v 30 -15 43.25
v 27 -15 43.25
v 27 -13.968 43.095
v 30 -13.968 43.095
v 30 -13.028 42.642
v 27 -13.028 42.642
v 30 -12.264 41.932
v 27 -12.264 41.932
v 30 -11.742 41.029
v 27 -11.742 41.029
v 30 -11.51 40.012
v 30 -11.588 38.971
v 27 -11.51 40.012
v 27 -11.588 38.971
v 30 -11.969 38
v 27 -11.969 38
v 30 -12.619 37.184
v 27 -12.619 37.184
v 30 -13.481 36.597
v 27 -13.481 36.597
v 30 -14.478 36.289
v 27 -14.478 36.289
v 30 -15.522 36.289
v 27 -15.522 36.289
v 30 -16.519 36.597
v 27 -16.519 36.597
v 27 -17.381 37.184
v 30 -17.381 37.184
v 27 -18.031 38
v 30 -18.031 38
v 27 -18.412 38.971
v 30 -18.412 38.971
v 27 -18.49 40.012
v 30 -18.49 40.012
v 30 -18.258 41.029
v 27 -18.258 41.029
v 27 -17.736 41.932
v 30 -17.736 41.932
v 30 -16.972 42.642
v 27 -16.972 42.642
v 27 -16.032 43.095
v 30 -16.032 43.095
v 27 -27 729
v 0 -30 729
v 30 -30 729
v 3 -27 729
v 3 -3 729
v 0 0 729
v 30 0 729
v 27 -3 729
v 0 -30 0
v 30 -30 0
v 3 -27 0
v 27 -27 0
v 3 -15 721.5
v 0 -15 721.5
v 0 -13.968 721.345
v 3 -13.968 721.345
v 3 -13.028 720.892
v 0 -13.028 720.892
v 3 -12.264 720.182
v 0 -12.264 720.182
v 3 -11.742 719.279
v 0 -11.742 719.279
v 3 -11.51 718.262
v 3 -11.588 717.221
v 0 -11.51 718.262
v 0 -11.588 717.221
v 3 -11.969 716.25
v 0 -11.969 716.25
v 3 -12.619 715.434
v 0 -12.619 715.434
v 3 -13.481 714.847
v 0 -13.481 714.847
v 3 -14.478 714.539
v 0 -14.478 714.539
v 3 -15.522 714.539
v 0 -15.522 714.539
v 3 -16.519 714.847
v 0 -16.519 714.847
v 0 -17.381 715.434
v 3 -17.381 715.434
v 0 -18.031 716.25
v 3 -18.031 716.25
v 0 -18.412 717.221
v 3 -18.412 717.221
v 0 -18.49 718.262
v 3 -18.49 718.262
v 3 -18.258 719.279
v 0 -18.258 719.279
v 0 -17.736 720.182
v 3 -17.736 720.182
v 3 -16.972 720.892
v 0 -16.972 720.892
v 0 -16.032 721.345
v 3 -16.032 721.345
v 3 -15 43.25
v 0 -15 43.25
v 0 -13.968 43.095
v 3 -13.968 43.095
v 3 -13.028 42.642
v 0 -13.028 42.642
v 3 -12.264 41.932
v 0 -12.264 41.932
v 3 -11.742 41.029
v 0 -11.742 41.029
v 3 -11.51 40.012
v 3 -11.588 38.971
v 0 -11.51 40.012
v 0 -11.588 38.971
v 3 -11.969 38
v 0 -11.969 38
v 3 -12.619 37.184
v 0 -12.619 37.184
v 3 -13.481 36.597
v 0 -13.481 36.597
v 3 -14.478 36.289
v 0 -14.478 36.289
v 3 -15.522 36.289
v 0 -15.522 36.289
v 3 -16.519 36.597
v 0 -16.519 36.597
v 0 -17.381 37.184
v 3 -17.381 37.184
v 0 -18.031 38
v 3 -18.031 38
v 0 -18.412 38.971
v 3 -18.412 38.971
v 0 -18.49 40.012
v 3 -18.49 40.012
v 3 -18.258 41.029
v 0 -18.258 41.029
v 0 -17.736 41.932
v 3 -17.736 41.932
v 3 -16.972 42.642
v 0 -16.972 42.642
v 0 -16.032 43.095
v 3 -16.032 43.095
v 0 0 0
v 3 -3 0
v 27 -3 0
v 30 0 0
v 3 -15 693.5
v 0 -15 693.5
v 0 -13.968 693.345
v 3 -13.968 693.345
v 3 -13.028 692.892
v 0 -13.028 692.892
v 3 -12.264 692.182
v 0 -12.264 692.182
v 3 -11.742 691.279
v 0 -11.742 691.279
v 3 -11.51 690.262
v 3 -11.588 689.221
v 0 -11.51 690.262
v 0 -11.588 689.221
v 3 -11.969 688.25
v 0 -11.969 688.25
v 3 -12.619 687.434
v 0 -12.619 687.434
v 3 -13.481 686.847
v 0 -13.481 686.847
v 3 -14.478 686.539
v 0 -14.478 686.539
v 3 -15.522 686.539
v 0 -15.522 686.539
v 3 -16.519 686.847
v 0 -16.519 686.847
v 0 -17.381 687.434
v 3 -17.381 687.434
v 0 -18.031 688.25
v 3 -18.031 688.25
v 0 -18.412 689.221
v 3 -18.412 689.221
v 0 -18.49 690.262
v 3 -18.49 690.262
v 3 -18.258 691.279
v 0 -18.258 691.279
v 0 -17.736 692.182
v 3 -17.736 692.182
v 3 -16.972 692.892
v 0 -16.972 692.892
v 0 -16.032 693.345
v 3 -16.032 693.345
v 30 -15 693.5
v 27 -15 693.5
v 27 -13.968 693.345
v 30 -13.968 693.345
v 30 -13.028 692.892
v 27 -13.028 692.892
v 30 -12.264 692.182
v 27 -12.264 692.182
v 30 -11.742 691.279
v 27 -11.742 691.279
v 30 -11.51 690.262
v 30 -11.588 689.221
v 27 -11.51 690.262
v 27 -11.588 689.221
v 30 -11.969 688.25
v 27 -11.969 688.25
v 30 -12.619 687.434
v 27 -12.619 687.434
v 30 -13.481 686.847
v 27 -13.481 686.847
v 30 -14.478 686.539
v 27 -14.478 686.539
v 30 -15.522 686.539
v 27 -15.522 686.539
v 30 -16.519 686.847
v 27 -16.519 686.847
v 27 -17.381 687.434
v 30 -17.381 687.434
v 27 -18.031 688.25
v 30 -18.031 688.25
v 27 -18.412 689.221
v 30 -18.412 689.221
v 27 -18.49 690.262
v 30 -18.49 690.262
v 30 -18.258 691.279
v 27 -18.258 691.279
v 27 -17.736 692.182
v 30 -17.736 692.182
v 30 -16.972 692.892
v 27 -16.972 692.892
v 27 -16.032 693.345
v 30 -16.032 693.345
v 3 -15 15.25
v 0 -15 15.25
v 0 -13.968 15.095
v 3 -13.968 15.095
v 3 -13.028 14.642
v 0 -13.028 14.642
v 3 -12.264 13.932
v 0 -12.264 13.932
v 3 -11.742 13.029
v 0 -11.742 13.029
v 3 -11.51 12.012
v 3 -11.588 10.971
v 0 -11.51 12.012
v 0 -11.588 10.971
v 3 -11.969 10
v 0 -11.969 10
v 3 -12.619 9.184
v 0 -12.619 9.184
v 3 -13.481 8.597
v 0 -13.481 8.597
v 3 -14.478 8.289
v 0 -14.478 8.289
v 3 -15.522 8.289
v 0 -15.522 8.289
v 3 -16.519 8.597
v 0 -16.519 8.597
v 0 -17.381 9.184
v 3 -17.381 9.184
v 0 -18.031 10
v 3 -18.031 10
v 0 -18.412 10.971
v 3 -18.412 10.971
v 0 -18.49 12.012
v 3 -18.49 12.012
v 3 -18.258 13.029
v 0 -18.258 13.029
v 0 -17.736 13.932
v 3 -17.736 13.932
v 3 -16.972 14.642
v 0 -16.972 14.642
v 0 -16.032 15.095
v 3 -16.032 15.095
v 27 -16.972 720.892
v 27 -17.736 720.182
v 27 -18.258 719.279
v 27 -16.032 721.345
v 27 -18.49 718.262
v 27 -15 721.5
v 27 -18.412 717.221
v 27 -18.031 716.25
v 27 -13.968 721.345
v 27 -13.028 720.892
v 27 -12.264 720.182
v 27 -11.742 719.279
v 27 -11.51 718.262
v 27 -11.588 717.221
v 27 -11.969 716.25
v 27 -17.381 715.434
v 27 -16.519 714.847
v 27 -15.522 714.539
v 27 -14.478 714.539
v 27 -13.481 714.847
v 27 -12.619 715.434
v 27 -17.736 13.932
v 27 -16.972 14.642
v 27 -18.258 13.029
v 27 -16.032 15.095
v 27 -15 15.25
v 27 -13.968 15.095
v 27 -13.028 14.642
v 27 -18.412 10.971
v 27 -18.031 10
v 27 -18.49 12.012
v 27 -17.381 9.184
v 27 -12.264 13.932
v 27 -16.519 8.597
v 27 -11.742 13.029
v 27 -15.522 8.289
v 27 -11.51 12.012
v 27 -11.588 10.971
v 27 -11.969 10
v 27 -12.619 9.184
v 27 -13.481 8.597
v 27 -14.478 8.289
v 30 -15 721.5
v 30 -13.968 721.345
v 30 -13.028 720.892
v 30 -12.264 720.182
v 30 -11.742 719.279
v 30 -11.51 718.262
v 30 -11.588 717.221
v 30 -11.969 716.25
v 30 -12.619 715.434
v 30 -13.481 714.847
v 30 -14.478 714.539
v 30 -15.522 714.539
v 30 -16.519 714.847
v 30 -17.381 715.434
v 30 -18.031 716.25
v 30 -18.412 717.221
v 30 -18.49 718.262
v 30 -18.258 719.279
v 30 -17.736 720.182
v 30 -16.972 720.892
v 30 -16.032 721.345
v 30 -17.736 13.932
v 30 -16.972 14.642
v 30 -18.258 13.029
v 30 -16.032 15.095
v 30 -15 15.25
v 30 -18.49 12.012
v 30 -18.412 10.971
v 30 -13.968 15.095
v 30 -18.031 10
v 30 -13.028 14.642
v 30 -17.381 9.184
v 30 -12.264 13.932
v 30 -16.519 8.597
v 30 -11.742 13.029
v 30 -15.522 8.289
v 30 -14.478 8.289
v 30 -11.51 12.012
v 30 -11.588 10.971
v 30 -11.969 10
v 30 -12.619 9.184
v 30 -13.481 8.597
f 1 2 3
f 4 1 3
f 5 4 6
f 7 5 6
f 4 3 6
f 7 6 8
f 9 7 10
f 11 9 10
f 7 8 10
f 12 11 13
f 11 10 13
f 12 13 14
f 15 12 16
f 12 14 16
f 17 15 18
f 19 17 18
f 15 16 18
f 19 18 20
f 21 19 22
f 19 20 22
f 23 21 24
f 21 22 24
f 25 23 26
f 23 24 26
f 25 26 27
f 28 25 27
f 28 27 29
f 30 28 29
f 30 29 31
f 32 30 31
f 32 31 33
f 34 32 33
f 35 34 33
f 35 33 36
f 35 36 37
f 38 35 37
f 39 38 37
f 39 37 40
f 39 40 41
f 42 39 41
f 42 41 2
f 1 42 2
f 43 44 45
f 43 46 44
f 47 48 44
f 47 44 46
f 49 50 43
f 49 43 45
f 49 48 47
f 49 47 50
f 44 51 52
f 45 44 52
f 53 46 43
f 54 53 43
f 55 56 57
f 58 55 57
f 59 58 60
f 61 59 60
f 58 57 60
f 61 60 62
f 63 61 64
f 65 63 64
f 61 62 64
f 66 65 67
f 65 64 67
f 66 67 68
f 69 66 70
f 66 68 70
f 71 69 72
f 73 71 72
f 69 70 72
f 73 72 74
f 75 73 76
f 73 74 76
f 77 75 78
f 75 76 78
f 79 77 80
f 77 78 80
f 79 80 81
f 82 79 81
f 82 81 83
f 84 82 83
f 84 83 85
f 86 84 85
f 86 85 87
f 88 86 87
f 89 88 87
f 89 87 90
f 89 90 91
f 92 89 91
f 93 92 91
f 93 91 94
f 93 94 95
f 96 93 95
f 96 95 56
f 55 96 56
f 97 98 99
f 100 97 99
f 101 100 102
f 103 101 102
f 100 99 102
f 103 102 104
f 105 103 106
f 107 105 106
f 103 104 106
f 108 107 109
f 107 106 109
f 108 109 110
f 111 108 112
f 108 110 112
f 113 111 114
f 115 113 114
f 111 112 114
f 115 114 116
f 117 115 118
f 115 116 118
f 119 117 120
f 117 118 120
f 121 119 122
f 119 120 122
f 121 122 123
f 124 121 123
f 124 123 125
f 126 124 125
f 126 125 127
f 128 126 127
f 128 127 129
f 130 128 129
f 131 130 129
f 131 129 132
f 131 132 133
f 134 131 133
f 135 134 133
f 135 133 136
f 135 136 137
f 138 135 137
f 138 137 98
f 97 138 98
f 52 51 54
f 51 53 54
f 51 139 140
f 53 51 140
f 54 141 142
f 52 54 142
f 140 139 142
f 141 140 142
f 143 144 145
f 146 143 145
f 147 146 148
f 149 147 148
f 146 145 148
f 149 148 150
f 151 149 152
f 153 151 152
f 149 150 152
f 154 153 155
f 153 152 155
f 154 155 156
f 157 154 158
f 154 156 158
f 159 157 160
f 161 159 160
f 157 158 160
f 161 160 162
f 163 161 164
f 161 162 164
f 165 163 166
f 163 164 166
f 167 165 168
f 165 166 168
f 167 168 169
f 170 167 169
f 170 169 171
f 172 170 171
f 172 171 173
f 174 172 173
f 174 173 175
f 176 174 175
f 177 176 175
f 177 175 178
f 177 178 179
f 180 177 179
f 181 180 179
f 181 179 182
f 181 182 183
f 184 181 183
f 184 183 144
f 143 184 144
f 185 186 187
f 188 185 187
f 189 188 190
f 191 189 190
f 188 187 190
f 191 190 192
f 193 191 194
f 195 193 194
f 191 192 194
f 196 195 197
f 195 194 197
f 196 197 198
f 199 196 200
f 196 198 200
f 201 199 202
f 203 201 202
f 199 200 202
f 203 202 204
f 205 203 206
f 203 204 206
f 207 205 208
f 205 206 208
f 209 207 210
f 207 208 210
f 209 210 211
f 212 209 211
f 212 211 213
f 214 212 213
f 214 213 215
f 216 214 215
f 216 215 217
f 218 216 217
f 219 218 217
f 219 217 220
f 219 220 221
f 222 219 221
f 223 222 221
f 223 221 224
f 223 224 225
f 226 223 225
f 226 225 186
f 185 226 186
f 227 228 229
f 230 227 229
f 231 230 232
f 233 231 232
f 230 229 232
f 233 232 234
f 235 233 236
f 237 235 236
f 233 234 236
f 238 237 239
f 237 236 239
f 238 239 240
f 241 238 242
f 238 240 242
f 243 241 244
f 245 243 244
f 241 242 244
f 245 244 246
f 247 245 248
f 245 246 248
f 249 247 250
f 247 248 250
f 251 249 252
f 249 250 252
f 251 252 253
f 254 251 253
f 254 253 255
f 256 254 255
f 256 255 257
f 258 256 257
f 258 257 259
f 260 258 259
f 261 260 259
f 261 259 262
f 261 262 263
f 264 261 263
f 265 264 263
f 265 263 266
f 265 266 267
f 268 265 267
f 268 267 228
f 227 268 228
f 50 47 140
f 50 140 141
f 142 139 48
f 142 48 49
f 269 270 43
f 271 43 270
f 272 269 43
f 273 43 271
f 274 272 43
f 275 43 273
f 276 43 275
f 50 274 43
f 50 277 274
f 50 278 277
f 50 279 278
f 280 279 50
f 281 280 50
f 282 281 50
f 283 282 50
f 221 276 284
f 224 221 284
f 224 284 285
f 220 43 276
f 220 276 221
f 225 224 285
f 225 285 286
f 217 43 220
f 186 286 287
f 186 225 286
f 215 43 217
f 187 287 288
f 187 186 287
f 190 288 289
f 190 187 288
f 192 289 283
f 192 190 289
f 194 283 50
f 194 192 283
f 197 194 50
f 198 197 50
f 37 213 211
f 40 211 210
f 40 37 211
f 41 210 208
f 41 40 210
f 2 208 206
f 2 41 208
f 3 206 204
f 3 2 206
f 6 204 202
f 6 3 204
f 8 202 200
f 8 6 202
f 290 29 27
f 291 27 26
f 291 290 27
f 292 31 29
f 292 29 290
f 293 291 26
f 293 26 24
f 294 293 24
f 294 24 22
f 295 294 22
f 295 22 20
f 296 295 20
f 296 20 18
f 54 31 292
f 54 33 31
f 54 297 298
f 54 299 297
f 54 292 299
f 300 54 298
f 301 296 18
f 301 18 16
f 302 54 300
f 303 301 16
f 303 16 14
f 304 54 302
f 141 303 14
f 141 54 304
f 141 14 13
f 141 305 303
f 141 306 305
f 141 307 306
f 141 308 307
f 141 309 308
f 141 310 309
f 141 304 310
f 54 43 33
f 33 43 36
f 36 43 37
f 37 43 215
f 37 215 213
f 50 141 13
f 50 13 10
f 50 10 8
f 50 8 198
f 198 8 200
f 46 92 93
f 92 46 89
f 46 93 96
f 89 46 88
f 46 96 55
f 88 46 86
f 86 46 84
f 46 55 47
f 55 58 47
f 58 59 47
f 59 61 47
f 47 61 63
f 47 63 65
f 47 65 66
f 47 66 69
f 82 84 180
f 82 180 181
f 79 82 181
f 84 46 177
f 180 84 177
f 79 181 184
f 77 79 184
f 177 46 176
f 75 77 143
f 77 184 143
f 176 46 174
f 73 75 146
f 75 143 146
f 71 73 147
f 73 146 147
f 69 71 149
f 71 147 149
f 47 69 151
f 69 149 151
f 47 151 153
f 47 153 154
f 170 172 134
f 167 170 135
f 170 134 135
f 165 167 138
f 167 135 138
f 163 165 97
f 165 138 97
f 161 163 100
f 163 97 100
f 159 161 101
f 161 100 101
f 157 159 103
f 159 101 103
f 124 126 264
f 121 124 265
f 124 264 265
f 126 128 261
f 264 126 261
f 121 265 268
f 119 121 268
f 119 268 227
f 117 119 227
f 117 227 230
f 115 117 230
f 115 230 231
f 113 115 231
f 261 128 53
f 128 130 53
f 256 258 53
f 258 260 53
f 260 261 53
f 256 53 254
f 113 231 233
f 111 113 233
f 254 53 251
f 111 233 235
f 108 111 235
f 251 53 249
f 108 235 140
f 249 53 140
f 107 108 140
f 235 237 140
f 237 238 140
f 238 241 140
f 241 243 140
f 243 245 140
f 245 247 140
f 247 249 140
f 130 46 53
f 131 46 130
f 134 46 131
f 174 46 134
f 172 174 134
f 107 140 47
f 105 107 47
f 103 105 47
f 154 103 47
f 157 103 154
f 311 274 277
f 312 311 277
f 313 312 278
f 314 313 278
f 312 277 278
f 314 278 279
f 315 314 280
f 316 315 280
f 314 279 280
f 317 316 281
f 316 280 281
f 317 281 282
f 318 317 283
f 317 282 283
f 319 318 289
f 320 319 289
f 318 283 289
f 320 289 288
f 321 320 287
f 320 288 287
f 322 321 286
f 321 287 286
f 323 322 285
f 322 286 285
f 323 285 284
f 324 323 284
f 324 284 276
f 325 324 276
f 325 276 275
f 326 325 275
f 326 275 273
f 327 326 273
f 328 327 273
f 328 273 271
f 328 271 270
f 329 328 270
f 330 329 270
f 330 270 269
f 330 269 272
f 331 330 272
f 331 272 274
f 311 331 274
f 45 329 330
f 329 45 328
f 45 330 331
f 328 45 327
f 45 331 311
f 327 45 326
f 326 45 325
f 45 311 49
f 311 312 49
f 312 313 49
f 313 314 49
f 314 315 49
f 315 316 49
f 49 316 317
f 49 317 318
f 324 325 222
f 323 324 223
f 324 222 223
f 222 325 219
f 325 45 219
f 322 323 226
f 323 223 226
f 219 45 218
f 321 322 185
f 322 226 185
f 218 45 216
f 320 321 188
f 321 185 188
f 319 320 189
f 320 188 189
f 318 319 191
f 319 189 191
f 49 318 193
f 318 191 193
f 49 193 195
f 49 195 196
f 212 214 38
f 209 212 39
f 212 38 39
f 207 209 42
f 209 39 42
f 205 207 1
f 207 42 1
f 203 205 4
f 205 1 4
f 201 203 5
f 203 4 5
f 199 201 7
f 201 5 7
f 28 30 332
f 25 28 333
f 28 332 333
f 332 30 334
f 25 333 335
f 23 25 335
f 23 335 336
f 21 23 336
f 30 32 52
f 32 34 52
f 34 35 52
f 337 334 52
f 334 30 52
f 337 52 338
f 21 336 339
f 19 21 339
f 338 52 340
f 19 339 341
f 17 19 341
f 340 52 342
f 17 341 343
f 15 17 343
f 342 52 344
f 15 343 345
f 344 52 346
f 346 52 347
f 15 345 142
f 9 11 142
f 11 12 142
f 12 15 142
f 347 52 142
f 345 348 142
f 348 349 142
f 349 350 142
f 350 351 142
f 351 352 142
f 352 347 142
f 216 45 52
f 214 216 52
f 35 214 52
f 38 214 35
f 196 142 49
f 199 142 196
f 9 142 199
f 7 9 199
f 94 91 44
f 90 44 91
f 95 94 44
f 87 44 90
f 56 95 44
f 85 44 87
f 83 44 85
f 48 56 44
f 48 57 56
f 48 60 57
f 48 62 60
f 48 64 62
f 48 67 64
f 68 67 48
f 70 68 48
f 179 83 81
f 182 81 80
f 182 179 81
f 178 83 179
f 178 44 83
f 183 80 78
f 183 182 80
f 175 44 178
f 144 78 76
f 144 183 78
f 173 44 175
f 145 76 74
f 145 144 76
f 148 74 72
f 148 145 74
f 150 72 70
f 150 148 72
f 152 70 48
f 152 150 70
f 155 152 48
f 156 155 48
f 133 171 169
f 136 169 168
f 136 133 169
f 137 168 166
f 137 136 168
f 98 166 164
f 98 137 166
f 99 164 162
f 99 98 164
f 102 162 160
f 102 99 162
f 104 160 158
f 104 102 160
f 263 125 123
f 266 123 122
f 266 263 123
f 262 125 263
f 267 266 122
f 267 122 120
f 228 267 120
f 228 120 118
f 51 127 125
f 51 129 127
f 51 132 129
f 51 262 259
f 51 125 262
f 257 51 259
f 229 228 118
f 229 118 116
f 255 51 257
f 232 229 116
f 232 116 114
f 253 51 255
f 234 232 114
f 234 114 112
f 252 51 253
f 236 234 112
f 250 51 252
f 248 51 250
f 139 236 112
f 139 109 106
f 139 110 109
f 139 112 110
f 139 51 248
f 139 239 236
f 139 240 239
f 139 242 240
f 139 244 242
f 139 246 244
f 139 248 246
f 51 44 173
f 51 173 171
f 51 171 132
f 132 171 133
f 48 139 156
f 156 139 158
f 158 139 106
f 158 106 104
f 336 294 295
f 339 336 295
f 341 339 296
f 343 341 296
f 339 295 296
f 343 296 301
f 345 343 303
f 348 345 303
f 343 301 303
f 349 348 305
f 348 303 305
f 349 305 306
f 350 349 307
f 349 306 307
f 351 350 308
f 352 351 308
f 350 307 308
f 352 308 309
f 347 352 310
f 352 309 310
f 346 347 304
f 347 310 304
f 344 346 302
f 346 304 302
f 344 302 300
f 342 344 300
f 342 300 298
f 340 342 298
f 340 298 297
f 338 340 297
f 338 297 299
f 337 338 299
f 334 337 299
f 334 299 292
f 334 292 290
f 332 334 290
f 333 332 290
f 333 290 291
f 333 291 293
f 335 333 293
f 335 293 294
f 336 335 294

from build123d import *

# Parameters (mm, degrees)
SKETCH_1_W             = 30
SKETCH_1_H             = 30
SKETCH_1_W_2           = 24
SKETCH_1_H_2           = 24
EXTRUDE_1_DEPTH        = 729
HOLE_WIZARD_7_0_7_1_D  = 7
PATTERN_LINEAR_1_COUNT = 2
PATTERN_LINEAR_1_PITCH = 678.25


with BuildPart() as part:
    # 草图1 → 拉伸1 (new body)
    with BuildSketch(Plane.XY):
        with Locations((15, -15)):
            Rectangle(SKETCH_1_W, SKETCH_1_H)
        with Locations((15, -15)):
            Rectangle(SKETCH_1_W_2, SKETCH_1_H_2, mode=Mode.SUBTRACT)
    extrude(amount=EXTRUDE_1_DEPTH)

    # Ø7.0 (7) 直径孔1 (through all)
    with Locations(Plane(origin=(30, 0, 0), x_dir=(0, 0, -1), z_dir=(1, 0, 0))):
        with Locations((-718, -15), (-690, -15)):
            hole_wizard_7_0_7_1 = Hole(HOLE_WIZARD_7_0_7_1_D / 2)

    # 阵列(线性)1: Ø7.0 (7) 直径孔1 ×2
    with Locations(*[(0, 0, -i * PATTERN_LINEAR_1_PITCH) for i in range(1, PATTERN_LINEAR_1_COUNT)]):
        add(hole_wizard_7_0_7_1, mode=Mode.SUBTRACT)


solid = part.part
